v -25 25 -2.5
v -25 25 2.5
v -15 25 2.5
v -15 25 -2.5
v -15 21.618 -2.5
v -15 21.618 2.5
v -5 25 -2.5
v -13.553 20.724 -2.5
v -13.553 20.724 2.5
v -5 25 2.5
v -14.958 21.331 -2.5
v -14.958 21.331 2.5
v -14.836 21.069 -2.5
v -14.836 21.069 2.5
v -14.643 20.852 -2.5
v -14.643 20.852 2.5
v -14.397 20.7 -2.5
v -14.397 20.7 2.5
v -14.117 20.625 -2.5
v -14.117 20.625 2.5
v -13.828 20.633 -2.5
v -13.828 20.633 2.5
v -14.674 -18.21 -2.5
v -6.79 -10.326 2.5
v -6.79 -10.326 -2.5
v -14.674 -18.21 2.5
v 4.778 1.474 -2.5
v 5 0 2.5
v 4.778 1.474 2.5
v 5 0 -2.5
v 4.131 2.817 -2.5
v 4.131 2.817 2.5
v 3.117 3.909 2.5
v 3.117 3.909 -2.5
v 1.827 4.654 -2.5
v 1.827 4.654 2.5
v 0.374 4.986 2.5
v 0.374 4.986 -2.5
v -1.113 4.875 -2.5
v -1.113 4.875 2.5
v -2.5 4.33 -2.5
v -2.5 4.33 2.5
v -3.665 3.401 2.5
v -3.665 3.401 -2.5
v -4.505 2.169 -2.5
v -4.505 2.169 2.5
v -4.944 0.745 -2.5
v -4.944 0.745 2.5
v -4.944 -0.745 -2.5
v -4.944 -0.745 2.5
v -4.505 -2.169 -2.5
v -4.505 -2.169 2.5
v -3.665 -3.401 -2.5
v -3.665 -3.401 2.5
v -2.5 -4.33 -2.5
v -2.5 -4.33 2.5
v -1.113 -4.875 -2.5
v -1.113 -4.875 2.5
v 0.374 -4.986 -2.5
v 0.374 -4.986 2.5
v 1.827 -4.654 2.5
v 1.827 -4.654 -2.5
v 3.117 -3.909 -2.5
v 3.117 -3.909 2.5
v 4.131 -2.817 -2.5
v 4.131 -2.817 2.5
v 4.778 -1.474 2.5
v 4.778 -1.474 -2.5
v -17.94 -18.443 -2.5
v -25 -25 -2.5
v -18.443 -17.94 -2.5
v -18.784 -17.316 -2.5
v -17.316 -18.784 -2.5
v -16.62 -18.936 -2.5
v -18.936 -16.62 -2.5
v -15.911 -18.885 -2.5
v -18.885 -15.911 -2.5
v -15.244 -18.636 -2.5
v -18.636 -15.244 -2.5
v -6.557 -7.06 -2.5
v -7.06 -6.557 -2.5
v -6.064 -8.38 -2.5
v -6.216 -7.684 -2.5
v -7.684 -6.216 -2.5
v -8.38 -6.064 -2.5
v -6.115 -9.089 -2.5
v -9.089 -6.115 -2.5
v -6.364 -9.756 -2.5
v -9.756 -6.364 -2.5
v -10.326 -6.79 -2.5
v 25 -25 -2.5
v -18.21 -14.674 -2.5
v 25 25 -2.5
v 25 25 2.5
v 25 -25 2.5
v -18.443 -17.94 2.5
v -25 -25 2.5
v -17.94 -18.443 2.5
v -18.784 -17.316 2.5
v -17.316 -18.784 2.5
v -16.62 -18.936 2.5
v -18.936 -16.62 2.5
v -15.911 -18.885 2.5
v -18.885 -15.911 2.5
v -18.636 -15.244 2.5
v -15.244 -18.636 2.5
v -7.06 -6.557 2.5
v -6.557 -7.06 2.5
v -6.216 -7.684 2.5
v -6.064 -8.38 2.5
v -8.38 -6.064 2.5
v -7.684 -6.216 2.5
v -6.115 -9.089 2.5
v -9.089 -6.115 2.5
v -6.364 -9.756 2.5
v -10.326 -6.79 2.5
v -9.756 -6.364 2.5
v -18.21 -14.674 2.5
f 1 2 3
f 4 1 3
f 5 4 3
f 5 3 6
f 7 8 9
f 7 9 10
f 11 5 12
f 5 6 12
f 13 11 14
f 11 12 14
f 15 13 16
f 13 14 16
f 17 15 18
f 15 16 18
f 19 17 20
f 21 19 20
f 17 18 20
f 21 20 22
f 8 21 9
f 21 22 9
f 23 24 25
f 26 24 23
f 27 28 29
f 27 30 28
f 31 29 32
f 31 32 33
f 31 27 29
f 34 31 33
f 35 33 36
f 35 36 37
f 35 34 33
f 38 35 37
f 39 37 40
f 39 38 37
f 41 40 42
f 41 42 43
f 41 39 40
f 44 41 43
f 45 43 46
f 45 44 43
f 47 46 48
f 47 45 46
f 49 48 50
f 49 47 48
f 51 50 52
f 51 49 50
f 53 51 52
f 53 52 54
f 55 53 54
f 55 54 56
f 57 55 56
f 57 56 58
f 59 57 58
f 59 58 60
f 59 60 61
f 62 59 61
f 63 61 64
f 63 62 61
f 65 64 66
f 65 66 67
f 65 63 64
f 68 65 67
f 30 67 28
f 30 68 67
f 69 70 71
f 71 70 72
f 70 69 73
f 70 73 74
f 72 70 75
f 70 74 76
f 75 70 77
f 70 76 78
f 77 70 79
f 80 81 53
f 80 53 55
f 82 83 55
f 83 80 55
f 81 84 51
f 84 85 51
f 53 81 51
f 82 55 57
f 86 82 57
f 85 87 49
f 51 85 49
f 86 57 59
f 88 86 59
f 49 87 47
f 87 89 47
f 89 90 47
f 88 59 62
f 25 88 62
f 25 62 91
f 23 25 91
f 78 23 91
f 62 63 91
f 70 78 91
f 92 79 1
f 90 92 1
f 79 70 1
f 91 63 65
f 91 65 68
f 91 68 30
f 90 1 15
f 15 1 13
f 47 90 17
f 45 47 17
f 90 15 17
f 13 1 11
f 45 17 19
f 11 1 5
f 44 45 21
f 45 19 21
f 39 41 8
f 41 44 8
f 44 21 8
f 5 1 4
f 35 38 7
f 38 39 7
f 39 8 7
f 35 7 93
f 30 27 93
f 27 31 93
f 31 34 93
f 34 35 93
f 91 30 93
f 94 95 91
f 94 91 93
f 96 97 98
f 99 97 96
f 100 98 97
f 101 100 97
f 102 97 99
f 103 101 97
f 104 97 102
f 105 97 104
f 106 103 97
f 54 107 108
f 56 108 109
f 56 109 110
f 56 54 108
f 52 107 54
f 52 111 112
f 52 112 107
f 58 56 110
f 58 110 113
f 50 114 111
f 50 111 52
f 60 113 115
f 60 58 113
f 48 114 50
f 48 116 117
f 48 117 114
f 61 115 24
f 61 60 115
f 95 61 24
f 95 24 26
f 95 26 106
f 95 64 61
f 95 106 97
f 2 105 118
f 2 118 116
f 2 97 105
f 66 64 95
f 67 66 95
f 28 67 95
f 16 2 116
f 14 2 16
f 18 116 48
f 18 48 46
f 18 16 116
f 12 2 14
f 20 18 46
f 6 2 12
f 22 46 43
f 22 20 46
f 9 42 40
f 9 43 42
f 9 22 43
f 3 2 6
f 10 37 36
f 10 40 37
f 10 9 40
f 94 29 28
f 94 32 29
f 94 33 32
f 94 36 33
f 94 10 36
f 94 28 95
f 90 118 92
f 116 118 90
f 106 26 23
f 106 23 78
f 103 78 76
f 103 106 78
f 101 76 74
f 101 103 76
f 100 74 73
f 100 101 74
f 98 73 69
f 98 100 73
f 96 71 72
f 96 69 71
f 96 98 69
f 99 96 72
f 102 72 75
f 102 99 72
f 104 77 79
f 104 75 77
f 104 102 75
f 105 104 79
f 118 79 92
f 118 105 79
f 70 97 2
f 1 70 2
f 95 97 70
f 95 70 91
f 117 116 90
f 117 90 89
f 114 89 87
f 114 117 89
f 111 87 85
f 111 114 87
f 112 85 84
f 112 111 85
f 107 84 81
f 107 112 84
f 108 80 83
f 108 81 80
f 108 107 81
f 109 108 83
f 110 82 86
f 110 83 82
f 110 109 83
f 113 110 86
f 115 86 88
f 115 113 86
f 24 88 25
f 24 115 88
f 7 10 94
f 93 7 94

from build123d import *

# Parameters (mm, degrees)
SKETCH1_W               = 50
SKETCH1_H               = 50
SKETCH1_R               = 5
BOSS_EXTRUDE1_DEPTH     = 2.5
CUT_EXTRUDE2_DEPTH      = 36.707142143
CUT_EXTRUDE2_DEPTH_BACK = 5
FILLET1_R               = 1
CUT_EXTRUDE3_DEPTH      = 36.707142143


with BuildPart() as part:
    # Sketch1 → Boss-Extrude1 (new, symmetric)
    with BuildSketch(Plane.XY):
        Rectangle(SKETCH1_W, SKETCH1_H)
        Circle(SKETCH1_R, mode=Mode.SUBTRACT)
    extrude(amount=BOSS_EXTRUDE1_DEPTH, both=True)

    # Sketch4 → Cut-Extrude2 (cut, two sides: drawn at the far end of the back side and taken through both)
    with BuildSketch(Plane.XY.offset(2.5).offset(-CUT_EXTRUDE2_DEPTH_BACK)):
        Polygon((-5, 25), (-15, 25), (-15, 20), align=None)
    extrude(amount=CUT_EXTRUDE2_DEPTH + CUT_EXTRUDE2_DEPTH_BACK, mode=Mode.SUBTRACT)

    # Fillet1
    fillet1_edges = [part.edges().sort_by_distance(p)[0] for p in [
        (-15, 20, 0),
    ]]
    fillet(fillet1_edges, radius=FILLET1_R)

    # Sketch5 → Cut-Extrude3 (cut, through all)
    with BuildSketch(Plane.XY.offset(2.5)):
        with BuildLine():
            Line((-6.790302071, -10.325835977), (-14.674164023, -18.209697929))
            ThreePointArc((-14.674164023, -18.209697929), (-18.209697929, -18.209697929), (-18.209697929, -14.674164023))
            Line((-18.209697929, -14.674164023), (-10.325835977, -6.790302071))
            ThreePointArc((-10.325835977, -6.790302071), (-6.790302071, -6.790302071), (-6.790302071, -10.325835977))
        make_face()
    extrude(amount=-CUT_EXTRUDE3_DEPTH, mode=Mode.SUBTRACT)


solid = part.part
